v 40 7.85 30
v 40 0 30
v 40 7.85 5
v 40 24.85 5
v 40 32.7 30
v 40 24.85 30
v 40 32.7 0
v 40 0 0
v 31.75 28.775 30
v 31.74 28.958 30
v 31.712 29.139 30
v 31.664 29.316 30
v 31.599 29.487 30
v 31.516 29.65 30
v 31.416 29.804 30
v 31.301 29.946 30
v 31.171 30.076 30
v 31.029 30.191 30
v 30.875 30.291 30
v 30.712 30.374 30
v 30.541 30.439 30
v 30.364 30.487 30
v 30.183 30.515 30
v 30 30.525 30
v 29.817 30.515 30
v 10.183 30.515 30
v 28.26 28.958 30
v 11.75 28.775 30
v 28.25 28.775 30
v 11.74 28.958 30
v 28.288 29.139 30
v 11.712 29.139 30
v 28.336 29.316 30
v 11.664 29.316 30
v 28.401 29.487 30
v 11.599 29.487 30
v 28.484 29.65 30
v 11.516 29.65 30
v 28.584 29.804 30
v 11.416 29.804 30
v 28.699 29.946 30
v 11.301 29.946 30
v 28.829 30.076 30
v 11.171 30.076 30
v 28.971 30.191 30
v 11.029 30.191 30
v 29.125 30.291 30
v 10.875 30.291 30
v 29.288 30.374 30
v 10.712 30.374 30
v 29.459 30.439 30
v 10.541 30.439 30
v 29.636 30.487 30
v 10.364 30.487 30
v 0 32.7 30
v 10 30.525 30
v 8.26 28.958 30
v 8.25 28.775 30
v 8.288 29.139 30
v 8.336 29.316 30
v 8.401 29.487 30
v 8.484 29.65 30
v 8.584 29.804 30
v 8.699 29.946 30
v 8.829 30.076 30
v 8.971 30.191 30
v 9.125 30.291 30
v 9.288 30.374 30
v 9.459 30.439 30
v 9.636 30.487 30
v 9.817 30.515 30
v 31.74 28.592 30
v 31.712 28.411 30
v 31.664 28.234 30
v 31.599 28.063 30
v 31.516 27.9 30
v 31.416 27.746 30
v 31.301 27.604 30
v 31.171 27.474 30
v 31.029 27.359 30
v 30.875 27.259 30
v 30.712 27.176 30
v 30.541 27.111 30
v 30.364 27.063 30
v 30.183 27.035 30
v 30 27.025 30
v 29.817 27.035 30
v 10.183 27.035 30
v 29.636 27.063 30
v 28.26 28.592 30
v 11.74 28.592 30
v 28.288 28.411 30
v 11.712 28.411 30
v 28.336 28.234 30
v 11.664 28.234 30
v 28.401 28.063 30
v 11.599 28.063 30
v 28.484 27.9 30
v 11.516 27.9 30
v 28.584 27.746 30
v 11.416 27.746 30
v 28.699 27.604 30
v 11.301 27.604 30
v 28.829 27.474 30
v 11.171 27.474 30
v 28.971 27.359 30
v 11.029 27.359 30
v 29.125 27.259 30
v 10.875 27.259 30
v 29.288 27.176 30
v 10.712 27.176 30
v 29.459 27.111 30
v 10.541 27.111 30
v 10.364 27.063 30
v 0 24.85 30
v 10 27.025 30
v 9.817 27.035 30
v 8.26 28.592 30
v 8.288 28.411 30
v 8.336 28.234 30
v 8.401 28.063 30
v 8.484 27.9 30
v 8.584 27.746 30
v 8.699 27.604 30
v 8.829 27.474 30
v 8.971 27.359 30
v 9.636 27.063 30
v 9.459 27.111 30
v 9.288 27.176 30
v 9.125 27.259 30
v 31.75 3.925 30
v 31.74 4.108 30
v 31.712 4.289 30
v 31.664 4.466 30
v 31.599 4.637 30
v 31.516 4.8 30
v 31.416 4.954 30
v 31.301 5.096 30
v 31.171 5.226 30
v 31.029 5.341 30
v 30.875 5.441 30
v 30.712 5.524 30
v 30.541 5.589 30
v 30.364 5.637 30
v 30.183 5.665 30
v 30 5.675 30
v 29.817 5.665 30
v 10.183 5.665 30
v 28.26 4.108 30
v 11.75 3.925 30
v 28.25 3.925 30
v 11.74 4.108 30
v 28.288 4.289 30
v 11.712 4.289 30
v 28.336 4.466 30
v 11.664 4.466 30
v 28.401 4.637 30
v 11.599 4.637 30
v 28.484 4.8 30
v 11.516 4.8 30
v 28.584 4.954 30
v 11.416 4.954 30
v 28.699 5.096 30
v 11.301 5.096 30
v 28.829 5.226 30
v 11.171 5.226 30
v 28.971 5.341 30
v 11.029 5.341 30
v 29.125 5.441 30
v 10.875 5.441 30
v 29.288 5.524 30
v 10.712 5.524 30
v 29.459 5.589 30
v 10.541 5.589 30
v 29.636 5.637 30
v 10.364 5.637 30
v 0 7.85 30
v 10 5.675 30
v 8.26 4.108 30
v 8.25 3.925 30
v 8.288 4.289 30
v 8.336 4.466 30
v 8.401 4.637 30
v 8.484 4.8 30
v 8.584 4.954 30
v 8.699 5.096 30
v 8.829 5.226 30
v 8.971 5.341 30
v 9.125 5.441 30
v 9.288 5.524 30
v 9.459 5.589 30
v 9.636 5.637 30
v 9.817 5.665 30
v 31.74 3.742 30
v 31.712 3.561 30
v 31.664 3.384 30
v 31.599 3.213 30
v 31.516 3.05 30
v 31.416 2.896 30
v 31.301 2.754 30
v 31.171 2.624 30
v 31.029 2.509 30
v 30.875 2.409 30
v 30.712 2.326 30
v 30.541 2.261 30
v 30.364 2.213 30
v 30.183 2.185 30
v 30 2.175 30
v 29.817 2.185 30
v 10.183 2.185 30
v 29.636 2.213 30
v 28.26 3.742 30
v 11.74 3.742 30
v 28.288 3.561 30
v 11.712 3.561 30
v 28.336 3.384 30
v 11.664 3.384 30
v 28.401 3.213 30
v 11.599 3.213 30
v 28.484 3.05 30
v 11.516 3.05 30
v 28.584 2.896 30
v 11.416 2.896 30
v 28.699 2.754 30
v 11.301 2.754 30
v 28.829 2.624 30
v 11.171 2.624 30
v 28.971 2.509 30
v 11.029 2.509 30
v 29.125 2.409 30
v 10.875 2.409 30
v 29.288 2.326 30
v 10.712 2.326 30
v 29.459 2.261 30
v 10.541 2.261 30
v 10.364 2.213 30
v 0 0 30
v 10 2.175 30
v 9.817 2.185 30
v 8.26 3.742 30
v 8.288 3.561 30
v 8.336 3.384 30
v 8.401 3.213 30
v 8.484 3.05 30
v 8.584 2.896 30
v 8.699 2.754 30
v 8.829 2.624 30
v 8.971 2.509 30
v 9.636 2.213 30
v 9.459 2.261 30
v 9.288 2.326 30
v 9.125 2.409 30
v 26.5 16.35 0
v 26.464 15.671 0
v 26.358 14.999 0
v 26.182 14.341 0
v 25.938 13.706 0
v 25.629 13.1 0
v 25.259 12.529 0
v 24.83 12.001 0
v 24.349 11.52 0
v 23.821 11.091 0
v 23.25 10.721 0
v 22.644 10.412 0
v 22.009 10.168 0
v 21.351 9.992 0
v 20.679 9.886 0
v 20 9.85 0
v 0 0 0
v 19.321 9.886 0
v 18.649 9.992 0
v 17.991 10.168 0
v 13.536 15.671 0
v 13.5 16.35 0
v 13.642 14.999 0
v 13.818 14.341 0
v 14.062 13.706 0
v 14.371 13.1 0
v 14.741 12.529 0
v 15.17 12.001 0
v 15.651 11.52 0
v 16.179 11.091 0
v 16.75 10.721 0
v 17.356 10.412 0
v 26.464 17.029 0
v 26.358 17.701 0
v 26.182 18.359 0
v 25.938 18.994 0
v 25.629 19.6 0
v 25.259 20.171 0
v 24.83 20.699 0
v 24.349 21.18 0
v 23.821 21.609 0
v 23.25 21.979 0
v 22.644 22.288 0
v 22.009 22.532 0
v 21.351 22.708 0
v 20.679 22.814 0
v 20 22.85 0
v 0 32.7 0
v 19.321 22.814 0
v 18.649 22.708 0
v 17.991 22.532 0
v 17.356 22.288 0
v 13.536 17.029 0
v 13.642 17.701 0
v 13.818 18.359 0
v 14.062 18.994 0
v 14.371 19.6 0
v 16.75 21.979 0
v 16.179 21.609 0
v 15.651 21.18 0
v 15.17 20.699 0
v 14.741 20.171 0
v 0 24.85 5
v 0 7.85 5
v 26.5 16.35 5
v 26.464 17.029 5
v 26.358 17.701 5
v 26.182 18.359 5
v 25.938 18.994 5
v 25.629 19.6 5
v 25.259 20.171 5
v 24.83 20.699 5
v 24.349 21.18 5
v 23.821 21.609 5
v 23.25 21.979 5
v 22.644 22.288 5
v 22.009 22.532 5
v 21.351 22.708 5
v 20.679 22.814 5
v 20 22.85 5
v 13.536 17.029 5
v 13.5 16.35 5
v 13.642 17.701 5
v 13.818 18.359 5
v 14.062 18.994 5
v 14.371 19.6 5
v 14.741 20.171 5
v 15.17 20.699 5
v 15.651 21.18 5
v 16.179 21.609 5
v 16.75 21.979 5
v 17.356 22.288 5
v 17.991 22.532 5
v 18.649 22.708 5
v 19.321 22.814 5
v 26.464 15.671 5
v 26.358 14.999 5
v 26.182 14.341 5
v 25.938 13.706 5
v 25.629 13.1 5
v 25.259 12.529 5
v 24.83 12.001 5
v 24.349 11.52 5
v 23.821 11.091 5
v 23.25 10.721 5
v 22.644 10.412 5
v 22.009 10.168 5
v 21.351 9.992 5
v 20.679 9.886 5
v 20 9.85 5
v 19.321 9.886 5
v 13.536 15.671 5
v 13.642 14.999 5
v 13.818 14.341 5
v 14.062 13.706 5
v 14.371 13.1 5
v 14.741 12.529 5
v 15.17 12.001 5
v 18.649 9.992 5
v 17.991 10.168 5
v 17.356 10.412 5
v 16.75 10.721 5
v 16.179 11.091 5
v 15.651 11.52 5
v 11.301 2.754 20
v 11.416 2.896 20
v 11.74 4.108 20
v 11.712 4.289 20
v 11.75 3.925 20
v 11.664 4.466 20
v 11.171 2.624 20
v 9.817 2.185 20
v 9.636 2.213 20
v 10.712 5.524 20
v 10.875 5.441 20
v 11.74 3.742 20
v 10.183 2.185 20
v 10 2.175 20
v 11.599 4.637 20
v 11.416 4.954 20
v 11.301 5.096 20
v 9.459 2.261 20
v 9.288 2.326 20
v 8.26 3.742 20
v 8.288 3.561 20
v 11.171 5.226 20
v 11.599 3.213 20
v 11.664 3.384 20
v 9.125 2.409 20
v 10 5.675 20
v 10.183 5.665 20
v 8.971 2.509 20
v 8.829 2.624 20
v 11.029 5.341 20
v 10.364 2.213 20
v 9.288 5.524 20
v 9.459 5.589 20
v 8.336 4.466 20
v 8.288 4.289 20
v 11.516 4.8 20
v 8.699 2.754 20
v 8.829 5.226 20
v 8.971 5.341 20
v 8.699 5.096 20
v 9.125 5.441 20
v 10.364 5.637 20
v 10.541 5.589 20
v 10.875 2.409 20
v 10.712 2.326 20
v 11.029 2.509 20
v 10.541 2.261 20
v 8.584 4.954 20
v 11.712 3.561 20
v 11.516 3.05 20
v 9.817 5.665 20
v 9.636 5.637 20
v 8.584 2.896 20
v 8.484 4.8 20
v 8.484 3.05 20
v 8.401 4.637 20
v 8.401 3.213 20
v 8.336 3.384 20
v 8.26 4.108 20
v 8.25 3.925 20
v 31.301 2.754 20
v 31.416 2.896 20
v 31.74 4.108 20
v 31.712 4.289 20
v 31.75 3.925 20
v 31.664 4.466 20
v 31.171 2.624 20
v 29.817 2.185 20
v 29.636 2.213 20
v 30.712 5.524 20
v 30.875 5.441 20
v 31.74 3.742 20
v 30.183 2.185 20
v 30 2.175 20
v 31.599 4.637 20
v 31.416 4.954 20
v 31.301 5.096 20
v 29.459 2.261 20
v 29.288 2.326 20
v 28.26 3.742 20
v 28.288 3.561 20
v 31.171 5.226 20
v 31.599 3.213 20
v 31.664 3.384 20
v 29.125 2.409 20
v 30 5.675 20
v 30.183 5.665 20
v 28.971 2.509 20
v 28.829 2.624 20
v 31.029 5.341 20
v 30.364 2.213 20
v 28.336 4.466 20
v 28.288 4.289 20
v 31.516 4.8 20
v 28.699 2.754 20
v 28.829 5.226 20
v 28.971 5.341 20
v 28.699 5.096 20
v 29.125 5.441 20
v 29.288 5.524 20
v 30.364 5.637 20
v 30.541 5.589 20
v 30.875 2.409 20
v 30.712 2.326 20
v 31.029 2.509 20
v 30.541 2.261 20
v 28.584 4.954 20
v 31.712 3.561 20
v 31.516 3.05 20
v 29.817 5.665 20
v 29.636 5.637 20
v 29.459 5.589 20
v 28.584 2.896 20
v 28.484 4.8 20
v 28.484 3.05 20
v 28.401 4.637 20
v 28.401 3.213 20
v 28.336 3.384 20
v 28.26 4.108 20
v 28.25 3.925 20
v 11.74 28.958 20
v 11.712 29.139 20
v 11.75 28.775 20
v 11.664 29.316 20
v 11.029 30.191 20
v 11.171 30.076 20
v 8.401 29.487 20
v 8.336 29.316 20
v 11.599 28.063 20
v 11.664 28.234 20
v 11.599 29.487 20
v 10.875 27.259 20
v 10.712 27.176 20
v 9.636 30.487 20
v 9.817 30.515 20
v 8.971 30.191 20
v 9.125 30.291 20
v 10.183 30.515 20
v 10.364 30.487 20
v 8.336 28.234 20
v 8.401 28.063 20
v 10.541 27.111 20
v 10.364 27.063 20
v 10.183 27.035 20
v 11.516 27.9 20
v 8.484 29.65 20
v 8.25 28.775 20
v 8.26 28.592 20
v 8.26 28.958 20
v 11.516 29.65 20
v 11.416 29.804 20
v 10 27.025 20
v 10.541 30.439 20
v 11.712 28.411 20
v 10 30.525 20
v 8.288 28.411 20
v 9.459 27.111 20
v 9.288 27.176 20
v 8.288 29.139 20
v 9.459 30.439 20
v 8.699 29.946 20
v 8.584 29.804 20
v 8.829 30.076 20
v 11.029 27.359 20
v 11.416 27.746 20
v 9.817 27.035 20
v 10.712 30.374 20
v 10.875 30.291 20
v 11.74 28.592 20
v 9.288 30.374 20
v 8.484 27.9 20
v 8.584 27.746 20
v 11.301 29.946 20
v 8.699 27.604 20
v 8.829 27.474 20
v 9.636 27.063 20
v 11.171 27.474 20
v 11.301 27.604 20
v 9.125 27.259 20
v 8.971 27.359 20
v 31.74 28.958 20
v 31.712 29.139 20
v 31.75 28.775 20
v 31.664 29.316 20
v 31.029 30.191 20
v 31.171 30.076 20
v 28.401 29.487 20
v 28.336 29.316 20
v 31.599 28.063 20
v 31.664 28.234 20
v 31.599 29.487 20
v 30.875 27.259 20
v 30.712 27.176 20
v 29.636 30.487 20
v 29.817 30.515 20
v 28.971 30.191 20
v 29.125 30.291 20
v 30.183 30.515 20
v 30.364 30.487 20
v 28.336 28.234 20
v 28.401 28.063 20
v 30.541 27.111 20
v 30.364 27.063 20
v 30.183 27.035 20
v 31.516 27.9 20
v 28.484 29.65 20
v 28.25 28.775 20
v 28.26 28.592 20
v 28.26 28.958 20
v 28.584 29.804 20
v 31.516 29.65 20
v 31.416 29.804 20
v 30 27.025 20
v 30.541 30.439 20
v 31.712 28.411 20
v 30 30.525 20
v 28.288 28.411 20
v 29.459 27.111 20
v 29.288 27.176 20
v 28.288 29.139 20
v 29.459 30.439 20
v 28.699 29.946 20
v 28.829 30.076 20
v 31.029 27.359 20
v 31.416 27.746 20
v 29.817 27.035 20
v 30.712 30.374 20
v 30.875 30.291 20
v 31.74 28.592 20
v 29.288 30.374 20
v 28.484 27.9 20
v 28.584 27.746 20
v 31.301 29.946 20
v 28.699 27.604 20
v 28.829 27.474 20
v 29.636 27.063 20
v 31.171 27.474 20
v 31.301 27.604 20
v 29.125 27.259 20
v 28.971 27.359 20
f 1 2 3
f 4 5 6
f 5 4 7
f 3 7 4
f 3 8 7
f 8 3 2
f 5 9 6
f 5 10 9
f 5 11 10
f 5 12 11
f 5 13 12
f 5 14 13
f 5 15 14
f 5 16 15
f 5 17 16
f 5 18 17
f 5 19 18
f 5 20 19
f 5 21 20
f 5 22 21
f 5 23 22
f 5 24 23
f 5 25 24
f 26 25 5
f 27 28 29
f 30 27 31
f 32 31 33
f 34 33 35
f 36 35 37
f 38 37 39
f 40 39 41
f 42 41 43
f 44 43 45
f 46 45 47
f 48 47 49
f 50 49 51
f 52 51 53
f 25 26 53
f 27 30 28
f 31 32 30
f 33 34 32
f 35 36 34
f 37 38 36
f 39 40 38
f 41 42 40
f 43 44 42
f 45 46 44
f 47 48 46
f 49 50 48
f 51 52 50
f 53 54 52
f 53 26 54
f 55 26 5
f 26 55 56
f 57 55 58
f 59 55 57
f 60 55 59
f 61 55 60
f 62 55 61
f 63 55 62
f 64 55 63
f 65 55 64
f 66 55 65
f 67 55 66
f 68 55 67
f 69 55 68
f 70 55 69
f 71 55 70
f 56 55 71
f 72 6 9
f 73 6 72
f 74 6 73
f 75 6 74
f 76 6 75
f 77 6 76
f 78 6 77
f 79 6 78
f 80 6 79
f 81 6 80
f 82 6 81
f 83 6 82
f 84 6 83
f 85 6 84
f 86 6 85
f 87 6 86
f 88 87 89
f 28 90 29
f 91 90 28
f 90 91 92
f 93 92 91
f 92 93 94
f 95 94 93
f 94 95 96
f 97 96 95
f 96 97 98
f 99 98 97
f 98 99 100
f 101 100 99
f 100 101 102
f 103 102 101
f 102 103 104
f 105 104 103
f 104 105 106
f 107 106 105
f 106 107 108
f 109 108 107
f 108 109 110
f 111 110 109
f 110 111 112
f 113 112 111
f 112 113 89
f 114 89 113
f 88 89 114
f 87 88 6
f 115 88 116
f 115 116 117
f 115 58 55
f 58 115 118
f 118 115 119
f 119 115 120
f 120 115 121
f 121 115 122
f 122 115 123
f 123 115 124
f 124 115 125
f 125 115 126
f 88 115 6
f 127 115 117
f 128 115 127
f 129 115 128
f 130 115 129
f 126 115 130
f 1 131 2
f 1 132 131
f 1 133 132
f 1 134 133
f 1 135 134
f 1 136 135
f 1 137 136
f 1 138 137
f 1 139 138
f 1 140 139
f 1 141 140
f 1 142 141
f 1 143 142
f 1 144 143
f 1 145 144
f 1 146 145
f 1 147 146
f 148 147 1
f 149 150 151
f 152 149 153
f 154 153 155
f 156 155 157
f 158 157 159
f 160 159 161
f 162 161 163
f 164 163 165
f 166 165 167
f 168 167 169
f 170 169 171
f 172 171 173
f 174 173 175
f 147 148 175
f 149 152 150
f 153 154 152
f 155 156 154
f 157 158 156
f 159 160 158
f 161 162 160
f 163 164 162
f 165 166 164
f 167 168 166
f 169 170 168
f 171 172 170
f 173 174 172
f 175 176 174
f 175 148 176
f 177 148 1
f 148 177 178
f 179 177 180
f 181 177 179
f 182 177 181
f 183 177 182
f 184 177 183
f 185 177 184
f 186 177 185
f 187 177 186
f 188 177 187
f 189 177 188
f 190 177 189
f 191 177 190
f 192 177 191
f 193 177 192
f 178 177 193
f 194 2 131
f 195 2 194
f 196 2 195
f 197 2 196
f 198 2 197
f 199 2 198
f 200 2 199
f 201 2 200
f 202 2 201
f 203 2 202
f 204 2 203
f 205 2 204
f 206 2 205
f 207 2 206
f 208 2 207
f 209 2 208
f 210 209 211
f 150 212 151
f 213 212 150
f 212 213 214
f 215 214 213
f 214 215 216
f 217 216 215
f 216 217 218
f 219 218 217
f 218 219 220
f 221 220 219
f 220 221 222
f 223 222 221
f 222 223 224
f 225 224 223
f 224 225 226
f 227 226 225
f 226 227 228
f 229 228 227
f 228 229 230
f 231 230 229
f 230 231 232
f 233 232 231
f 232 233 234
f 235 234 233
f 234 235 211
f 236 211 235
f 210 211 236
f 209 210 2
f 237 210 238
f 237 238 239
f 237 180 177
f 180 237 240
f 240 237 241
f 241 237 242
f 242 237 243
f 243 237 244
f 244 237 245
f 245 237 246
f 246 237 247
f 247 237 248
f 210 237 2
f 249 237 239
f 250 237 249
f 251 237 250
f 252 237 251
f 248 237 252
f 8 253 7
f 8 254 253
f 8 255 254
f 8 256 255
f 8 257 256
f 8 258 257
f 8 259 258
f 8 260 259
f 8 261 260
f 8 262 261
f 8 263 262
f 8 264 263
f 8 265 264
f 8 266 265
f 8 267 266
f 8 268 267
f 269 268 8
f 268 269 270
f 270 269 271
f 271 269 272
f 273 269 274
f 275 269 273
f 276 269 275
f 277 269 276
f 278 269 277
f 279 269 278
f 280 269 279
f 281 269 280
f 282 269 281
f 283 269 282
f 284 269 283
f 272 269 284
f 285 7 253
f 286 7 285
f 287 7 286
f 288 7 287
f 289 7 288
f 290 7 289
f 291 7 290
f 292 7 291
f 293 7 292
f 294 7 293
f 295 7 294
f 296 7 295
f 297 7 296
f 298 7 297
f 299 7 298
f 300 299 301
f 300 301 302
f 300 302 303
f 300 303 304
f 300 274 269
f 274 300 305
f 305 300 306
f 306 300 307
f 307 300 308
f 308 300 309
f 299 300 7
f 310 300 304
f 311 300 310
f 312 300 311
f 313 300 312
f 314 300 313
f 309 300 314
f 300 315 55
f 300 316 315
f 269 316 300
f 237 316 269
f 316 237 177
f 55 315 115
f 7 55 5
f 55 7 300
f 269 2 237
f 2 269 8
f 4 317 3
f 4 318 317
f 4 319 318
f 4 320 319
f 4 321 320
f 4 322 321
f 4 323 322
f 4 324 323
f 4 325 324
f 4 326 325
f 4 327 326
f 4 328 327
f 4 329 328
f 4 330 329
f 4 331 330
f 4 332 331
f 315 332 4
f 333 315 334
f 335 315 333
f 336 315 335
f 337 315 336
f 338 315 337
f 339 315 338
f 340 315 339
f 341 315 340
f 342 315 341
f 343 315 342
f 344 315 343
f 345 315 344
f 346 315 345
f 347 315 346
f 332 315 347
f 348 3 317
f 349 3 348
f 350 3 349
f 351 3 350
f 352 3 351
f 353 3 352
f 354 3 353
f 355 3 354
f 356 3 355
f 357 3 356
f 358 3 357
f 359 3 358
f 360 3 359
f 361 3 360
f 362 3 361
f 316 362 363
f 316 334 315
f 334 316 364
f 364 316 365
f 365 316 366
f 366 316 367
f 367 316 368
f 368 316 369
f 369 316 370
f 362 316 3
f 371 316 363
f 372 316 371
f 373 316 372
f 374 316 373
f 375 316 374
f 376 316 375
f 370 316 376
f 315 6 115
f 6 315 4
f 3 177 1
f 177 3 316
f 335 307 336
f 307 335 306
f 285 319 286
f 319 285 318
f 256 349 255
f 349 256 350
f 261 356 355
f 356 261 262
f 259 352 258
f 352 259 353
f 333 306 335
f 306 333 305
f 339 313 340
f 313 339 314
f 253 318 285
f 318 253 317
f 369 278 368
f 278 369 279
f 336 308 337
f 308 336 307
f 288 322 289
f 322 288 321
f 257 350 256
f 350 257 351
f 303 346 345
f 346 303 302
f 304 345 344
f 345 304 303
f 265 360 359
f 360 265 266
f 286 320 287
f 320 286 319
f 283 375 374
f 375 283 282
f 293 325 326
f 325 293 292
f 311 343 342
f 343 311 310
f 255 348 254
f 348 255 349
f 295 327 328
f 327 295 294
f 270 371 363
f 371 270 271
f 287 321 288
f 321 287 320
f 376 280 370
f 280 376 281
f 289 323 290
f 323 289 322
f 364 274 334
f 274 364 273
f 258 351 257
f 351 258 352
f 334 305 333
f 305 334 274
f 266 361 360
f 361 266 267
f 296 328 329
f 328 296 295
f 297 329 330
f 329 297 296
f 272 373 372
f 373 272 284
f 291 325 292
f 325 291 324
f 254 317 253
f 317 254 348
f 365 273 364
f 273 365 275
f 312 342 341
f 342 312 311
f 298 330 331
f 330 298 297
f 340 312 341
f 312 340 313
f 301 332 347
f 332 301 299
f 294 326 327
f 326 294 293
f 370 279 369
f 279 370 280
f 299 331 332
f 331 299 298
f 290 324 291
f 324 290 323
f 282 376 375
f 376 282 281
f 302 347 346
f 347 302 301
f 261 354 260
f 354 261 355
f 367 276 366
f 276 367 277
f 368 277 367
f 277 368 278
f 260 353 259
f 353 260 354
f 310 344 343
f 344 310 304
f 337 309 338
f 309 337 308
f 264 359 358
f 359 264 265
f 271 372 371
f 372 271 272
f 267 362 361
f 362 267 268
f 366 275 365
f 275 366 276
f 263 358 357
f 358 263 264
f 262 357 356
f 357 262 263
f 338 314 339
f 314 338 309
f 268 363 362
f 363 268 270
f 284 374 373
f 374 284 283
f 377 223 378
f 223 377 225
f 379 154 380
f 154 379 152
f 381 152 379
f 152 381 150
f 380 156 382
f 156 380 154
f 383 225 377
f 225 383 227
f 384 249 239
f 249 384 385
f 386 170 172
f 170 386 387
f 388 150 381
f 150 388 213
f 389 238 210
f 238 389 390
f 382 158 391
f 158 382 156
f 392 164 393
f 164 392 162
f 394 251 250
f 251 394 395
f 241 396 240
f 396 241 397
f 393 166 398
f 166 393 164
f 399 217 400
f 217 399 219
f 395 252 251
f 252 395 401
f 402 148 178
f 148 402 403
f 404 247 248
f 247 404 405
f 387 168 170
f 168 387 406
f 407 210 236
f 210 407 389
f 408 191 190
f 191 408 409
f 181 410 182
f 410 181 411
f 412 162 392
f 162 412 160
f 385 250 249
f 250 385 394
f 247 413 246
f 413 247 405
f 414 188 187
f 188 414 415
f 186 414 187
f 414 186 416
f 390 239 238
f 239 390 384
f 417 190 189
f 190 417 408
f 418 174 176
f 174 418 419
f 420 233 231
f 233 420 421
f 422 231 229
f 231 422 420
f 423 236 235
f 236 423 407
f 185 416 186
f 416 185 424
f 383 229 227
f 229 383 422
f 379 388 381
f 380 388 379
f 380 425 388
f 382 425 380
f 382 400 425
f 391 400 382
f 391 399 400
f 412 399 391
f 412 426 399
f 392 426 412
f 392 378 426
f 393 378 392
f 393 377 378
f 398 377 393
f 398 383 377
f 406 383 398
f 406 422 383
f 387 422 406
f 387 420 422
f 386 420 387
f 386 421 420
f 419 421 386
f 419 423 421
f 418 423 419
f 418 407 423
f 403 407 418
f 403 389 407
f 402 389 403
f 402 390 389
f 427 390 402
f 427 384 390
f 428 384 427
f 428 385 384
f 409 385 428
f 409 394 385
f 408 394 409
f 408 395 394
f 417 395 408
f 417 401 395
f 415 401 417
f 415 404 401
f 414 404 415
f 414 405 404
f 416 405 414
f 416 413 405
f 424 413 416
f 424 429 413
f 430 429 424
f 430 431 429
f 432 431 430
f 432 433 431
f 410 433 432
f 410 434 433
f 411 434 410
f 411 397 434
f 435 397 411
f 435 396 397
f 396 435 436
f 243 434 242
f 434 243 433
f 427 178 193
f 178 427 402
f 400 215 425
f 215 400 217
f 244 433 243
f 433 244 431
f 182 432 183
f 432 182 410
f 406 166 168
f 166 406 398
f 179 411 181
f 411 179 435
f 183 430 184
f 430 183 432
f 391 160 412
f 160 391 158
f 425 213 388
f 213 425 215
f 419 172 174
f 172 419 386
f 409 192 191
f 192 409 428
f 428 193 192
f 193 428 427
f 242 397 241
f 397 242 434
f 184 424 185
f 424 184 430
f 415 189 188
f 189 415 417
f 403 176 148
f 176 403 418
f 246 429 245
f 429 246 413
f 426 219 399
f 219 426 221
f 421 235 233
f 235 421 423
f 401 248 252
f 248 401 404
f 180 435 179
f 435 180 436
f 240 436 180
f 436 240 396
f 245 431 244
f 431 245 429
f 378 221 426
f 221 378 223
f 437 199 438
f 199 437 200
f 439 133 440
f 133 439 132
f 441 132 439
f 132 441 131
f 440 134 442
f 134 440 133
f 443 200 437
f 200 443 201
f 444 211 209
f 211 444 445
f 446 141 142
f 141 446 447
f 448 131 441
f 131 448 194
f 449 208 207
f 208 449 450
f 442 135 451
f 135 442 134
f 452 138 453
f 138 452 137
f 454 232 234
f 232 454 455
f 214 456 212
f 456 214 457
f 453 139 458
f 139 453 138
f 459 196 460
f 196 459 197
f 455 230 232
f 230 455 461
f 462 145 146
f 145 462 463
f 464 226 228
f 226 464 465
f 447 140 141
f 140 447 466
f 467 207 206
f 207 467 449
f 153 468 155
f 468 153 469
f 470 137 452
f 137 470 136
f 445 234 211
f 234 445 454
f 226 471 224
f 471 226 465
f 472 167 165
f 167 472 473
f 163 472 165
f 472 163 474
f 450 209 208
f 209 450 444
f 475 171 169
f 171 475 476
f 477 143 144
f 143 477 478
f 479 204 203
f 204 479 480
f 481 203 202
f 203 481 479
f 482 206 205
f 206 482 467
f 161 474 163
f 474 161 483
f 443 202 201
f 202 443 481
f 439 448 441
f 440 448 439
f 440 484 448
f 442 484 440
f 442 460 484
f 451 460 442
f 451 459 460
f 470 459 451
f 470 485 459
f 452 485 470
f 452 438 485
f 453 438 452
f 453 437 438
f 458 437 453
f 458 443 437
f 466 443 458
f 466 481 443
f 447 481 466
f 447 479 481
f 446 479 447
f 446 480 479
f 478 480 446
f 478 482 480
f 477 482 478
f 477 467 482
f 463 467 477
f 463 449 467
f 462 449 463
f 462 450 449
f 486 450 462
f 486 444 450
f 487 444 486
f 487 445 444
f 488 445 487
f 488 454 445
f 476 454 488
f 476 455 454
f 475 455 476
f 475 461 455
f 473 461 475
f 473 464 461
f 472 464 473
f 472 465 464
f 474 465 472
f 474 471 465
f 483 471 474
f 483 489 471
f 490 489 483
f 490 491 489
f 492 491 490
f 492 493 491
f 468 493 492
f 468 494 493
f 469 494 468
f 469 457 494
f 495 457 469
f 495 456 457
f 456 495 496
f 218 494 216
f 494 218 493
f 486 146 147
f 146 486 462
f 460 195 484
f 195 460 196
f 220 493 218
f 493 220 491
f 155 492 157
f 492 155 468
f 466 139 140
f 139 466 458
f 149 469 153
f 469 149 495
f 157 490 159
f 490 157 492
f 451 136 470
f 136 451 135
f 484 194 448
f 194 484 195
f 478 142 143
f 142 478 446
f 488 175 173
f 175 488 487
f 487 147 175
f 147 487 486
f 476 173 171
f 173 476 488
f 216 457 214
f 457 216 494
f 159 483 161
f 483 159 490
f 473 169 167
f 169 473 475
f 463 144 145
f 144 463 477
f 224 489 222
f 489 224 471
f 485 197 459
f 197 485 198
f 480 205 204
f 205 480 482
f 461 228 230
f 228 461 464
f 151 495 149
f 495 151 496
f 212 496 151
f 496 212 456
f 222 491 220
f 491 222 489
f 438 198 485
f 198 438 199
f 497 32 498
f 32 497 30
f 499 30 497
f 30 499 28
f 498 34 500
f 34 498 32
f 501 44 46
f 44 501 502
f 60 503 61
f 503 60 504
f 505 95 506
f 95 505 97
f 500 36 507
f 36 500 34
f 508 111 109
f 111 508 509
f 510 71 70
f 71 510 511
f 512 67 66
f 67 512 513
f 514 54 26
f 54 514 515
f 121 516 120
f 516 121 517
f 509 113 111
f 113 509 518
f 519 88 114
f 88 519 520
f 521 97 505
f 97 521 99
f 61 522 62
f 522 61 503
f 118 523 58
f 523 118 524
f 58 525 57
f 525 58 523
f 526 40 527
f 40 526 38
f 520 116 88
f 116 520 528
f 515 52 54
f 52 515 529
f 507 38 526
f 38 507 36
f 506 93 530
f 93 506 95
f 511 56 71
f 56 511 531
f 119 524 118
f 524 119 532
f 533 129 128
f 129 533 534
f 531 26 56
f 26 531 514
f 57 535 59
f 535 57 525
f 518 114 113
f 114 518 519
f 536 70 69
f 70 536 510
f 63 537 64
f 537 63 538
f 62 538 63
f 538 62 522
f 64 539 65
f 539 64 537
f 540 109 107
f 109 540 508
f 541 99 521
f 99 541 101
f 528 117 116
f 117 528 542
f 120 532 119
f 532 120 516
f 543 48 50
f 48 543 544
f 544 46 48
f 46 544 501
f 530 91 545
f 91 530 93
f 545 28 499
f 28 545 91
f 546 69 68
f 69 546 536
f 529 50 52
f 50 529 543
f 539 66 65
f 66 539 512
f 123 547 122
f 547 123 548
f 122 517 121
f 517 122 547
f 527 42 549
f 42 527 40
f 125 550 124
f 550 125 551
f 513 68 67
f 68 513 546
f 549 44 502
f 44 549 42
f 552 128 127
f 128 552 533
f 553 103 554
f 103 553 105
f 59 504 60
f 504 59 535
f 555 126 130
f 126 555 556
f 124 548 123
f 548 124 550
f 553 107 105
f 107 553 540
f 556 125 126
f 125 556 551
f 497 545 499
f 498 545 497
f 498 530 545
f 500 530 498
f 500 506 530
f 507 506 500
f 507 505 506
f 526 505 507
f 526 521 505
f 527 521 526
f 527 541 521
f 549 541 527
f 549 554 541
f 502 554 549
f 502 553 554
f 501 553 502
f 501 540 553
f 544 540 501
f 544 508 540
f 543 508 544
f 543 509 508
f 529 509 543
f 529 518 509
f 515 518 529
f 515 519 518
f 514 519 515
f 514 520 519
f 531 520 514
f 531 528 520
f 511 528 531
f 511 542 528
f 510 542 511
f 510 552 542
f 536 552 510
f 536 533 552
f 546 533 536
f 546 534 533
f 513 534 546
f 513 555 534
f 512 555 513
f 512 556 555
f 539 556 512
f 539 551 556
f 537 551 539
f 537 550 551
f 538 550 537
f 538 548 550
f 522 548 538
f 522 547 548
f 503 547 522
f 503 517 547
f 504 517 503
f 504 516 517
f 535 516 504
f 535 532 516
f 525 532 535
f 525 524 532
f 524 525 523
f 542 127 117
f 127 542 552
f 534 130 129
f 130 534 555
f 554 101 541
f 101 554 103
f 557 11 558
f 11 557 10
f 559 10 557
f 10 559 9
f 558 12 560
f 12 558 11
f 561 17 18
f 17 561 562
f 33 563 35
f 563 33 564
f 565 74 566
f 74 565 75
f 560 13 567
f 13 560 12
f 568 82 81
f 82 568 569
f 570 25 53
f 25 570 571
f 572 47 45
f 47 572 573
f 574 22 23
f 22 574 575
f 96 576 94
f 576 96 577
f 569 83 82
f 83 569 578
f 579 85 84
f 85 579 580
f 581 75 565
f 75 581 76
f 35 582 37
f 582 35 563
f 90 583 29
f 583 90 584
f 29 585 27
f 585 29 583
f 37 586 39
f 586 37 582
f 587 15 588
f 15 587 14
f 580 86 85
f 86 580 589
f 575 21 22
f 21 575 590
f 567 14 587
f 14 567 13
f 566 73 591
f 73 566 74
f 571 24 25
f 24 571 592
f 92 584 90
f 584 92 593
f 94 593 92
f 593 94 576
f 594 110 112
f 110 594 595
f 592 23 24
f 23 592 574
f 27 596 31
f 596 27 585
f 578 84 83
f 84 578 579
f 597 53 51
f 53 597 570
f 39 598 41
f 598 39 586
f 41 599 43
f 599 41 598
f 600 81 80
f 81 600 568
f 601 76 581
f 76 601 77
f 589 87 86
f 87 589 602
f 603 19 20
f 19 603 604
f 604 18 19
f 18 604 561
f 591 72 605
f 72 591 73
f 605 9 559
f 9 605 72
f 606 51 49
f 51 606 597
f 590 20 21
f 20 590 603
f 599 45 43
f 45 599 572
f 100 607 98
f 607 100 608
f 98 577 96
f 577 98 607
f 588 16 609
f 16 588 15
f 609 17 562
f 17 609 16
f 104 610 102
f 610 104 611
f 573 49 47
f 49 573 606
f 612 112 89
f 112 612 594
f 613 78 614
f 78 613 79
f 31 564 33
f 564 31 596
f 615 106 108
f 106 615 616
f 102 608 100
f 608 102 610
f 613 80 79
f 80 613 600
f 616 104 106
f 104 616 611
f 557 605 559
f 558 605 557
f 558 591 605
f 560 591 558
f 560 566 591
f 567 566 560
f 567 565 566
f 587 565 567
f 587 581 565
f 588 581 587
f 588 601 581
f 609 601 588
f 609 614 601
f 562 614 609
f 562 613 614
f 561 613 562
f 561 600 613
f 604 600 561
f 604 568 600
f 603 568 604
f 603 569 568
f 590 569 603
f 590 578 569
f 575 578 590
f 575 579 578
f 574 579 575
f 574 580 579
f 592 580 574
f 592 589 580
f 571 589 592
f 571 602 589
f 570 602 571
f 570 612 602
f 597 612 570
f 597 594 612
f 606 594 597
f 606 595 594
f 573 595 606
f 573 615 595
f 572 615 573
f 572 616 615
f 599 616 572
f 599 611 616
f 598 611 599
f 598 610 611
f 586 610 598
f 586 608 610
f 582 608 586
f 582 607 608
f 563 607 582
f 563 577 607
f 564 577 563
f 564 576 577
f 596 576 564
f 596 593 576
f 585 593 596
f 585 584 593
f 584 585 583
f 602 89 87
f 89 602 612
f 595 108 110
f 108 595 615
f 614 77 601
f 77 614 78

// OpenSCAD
// file: orp_bits.scad
module mount_holes(z, dia = m3_clearance, caps = 0){
    cylinder(h = z, r = dia/2);
    if(caps > 0){
        if(caps == 1 || caps == 3) 
            cylinder(h=m3_cap_depth, r = m3_cap_clear/2);
        if(caps == 2 || caps == 3)
            translate([0, 0, z-m3_cap_depth])
                cylinder(h=m3_cap_depth, r = m3_cap_clear/2);
    }         
} 
// file: metric_screw_sizes.scad
//sizes for metric screws that work
m3_clearance = 3.85;
m3_tight = 3.5;
m3_cap_clear = 6;
m3_cap_depth = 3.3;
m3_nut_clear = 7;
// main file
//holder for  switch
$fn = 60;

include <metric_screw_sizes.scad>
include <orp_bits.scad>

switch_height = 25;
switch_depth = 17; //wired end ~34mm
switch_width = 40;
mount_wall_thickness = m3_clearance + 4;
echo("the walls will be: ", mount_wall_thickness, " mm");
mount_top_thickness = 5;
mount_x_center = (switch_width)/2;
mount_y_center = (2*mount_wall_thickness + switch_depth)/2;
mount_height = switch_height + mount_top_thickness;
mount_depth = switch_depth + 2*mount_wall_thickness;


difference(){
    cube([switch_width, mount_depth, mount_height]);
    translate([0, mount_wall_thickness, mount_top_thickness])
        cube([switch_width, switch_depth, switch_height]);
    translate([mount_x_center, mount_y_center,0])
        cylinder(mount_top_thickness, r = 6.5);
    //mounting holes
    translate([mount_x_center - 10, mount_wall_thickness/2, mount_height -10])
        mount_holes(z = 10, dia = m3_tight);
    translate([mount_x_center + 10, mount_wall_thickness/2, mount_height - 10])
        mount_holes(z = 10, dia = m3_tight);
    translate([mount_x_center - 10, mount_depth - mount_wall_thickness/2, mount_height -10])
        mount_holes(z = 10, dia = m3_tight);
    translate([mount_x_center + 10, mount_depth - mount_wall_thickness/2, mount_height - 10])
        mount_holes(z = 10, dia = m3_tight);
}
